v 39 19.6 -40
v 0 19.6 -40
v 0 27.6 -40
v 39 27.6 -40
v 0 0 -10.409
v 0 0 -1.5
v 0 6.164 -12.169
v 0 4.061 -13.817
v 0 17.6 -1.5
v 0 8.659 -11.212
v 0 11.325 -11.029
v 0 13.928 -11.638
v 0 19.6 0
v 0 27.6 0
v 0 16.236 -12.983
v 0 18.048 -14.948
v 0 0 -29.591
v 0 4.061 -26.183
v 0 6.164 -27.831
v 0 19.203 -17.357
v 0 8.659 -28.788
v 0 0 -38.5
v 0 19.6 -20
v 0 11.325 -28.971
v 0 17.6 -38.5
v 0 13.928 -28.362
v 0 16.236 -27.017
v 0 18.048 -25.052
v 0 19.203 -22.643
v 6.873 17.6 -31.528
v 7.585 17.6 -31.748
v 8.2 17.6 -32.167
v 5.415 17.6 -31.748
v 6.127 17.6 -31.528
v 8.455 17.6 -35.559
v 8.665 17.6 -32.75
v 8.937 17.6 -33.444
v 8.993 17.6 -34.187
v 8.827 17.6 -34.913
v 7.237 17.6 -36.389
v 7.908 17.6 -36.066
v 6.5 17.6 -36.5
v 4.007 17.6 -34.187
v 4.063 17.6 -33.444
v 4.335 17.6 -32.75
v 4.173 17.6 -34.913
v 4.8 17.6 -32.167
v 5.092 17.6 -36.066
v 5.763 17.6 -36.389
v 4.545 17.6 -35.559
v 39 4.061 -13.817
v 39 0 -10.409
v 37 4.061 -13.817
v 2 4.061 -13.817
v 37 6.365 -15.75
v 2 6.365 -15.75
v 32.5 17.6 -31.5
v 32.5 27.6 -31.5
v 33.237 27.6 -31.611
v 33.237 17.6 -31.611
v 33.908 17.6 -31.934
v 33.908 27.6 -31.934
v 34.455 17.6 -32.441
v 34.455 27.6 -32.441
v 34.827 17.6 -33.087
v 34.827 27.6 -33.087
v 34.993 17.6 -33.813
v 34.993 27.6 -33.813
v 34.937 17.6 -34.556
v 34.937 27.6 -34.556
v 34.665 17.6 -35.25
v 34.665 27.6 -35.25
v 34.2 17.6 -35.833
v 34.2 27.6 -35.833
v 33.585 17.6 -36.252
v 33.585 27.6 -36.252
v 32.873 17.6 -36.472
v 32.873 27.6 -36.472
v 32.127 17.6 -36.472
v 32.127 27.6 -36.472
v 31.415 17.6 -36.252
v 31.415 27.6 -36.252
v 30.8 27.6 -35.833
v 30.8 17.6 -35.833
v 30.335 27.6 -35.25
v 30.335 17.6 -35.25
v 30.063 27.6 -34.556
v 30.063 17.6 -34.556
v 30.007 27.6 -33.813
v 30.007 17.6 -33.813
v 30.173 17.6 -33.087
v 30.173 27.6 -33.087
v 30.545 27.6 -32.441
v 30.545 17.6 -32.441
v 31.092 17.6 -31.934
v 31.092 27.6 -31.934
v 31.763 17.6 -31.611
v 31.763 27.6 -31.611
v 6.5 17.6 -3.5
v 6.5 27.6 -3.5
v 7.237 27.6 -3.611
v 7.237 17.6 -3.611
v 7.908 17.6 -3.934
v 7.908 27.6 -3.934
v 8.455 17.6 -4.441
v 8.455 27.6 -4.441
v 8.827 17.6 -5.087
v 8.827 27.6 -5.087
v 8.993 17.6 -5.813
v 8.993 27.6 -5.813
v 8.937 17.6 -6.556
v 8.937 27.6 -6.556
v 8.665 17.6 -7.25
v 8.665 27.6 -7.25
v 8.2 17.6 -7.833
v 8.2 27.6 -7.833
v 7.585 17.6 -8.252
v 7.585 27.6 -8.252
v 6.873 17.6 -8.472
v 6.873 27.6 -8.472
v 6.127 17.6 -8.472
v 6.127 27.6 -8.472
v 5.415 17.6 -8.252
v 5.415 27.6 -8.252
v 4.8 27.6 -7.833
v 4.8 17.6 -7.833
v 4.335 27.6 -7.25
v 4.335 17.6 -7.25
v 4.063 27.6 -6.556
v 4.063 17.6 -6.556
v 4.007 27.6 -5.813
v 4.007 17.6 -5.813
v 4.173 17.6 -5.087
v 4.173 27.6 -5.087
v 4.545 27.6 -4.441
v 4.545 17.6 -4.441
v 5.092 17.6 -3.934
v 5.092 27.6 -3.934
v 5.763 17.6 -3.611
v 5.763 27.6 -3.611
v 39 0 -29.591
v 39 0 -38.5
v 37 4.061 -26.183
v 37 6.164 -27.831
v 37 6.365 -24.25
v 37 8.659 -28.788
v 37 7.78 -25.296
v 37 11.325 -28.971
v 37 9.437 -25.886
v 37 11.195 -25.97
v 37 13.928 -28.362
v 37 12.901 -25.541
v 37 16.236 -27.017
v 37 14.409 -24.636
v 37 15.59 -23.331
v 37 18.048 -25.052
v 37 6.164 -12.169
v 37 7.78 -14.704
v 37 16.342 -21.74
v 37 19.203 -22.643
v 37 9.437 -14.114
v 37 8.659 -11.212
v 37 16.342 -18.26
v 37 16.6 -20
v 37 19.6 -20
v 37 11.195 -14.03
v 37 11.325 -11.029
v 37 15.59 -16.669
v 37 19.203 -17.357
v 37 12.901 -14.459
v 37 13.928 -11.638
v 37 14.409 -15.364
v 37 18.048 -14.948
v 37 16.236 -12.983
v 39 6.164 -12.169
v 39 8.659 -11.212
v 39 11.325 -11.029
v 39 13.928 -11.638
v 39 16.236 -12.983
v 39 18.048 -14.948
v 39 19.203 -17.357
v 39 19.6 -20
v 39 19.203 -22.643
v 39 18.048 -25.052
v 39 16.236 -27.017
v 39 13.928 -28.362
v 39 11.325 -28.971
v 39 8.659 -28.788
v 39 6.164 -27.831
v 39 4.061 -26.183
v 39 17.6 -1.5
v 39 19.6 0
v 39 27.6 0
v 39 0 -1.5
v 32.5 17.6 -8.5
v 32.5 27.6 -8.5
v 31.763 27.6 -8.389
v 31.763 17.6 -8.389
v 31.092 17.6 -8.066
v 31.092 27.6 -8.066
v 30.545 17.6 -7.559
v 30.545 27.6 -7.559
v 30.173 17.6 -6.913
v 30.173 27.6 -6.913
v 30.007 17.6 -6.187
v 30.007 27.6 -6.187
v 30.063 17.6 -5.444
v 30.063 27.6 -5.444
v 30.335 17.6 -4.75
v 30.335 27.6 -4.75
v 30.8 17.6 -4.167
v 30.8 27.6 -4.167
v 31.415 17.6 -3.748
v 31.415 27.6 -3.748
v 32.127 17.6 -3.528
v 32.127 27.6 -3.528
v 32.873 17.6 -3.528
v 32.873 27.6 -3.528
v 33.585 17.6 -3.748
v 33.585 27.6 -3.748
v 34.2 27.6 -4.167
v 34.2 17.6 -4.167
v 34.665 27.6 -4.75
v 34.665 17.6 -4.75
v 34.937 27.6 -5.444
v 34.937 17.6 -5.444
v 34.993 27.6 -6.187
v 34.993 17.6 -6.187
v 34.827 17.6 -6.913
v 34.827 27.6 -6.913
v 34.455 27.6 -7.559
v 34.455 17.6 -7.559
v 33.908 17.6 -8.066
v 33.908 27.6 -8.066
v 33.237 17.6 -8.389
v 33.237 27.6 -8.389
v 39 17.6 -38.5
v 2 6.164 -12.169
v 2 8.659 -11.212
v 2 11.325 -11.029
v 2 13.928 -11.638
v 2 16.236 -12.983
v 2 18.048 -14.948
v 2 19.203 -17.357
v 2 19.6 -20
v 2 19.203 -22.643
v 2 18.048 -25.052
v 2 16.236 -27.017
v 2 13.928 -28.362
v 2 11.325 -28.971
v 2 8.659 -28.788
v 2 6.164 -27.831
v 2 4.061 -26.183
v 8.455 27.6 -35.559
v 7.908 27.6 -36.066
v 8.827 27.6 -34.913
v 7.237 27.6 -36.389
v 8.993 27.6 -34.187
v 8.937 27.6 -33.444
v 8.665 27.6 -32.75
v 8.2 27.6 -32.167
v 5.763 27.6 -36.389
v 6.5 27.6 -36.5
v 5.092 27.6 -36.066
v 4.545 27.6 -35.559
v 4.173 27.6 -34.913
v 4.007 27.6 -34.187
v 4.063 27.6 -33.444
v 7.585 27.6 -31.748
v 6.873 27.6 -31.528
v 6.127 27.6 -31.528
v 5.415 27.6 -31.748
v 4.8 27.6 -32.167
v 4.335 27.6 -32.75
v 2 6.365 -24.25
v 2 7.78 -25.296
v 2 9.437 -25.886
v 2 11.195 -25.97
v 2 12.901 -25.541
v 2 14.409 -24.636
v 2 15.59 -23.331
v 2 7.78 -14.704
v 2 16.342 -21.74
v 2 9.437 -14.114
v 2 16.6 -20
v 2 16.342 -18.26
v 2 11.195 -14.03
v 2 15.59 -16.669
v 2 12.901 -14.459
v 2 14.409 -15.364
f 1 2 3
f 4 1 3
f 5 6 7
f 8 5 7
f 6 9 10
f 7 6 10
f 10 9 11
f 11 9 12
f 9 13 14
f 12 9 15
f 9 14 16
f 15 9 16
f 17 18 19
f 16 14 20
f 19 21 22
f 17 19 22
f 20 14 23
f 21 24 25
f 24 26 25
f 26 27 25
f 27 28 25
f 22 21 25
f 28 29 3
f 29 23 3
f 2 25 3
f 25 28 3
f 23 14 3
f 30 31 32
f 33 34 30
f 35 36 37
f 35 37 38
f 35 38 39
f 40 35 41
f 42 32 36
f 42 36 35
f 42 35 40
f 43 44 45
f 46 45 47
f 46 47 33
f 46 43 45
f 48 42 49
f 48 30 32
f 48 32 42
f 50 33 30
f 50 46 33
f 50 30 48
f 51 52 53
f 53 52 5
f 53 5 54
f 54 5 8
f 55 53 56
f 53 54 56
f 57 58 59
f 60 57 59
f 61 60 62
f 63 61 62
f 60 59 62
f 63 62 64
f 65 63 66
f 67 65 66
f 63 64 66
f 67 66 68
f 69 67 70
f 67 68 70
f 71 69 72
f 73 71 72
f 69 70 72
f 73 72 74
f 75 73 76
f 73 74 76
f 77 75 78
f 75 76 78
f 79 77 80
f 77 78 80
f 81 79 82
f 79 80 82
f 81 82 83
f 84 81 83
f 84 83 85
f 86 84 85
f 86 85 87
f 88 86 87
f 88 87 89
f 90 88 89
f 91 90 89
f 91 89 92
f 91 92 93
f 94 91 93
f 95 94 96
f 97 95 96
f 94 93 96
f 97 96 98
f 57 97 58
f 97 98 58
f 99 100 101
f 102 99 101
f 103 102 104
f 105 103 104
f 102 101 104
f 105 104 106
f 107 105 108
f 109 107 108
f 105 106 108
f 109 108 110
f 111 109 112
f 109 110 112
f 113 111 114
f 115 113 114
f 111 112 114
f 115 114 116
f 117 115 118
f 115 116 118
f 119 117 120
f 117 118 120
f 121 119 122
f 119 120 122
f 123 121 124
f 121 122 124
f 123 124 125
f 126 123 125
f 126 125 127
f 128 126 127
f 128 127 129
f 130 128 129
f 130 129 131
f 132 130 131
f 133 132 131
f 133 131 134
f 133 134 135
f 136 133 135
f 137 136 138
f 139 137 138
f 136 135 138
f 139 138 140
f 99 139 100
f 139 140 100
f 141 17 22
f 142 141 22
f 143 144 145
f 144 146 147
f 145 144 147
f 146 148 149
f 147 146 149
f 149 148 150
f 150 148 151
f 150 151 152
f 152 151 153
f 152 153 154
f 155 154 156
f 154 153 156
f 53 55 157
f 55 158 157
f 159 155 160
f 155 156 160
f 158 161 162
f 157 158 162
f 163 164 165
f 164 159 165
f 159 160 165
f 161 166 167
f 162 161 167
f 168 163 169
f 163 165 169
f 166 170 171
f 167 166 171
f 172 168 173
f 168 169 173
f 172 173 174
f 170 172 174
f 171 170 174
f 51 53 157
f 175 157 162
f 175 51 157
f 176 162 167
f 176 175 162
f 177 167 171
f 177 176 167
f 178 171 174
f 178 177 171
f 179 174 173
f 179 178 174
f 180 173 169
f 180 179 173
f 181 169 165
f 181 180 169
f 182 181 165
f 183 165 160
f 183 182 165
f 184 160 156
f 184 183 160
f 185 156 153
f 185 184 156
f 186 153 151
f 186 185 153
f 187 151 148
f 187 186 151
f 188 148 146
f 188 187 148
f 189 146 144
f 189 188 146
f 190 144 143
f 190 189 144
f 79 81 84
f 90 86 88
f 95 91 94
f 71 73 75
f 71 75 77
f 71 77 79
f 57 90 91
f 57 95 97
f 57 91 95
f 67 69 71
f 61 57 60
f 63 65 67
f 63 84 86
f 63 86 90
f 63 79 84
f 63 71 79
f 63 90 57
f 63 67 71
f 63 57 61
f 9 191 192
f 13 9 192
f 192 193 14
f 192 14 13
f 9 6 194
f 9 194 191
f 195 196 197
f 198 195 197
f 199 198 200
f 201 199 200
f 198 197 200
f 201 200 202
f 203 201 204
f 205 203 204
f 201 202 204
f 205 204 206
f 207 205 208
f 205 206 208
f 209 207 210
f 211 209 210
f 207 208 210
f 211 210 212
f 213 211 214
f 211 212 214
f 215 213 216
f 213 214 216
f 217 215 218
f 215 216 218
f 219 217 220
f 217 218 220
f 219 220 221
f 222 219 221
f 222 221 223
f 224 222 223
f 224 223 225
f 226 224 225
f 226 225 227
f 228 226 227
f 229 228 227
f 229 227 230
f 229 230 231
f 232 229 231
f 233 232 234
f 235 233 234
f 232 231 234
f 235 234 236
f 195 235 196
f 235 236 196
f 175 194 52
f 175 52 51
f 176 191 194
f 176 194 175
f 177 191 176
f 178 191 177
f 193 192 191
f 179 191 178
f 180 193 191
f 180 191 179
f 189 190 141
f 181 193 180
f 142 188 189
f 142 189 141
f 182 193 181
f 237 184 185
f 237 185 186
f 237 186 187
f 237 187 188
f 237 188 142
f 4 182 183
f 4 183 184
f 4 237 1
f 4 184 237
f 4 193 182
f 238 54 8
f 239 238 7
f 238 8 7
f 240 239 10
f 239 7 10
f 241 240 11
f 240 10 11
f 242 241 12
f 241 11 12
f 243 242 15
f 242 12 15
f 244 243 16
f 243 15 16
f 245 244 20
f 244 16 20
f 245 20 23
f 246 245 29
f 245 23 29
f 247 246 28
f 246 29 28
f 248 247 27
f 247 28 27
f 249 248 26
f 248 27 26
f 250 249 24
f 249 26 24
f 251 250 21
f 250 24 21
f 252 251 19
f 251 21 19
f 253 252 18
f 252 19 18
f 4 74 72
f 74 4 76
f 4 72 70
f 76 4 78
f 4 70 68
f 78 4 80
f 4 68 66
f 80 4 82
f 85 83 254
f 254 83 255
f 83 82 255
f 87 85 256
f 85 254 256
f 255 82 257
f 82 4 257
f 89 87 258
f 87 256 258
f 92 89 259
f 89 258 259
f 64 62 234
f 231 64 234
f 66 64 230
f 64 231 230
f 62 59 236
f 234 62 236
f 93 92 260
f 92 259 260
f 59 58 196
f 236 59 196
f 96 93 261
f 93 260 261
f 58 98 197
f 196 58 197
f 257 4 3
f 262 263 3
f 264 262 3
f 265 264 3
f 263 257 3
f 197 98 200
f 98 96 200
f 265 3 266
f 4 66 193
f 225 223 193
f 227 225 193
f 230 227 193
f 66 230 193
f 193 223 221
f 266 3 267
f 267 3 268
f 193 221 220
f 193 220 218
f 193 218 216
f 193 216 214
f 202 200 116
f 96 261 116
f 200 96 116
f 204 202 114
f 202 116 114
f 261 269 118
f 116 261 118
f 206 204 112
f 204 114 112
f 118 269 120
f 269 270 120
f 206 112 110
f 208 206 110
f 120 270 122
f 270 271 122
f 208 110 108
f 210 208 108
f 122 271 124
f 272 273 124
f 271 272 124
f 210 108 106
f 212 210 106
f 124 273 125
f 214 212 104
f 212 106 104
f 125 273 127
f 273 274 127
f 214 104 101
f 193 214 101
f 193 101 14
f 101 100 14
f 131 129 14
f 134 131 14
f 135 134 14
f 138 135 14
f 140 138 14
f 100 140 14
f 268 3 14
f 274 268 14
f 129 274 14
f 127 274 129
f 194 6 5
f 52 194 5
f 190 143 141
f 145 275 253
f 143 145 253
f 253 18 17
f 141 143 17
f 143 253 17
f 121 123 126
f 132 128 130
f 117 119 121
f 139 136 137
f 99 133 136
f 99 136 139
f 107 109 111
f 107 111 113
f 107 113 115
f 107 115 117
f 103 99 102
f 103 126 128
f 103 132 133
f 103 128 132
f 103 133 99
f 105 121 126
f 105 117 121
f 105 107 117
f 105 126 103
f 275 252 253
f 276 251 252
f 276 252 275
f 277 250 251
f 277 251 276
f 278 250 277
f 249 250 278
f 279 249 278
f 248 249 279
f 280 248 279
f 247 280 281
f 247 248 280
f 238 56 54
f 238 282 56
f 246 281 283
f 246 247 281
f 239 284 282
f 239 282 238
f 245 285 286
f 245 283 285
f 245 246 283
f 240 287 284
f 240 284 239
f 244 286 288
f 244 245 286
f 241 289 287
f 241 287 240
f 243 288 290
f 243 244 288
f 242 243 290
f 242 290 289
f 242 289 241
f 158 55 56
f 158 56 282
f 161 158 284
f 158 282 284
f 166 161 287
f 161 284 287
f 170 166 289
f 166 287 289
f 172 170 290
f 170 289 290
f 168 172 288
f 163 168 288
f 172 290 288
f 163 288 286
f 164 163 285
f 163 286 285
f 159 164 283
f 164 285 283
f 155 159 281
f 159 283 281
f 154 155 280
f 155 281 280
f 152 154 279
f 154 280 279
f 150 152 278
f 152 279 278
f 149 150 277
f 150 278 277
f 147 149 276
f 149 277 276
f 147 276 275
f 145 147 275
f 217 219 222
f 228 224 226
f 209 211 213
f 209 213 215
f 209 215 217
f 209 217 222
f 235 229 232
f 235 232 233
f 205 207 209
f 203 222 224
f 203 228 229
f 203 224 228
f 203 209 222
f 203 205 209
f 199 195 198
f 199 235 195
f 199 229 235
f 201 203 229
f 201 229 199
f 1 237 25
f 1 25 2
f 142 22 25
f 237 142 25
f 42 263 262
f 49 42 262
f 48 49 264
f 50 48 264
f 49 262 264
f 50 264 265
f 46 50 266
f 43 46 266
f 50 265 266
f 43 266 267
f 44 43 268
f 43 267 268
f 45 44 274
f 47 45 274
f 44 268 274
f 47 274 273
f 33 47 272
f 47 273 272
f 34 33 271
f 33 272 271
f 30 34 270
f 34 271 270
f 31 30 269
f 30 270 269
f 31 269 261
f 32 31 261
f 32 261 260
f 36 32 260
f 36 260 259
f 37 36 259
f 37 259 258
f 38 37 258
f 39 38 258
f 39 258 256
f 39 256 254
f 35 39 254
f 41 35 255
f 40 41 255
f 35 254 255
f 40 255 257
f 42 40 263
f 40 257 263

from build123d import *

# Parameters (mm, degrees)
EXTRUDE_1_DEPTH     = 39
SKETCH_3_R          = 9
CUT_EXTRUDE_1_DEPTH = 2
SKETCH_4_R          = 2.5
CUT_EXTRUDE_2_DEPTH = 10
CUT_EXTRUDE_4_DEPTH = 63.311796636


with BuildPart() as part:
    # 草图1 → 凸台-拉伸1 (new body)
    with BuildSketch(Plane(origin=(0, 0, 0), x_dir=(0, 0, -1), z_dir=(1, 0, 0))):
        with BuildLine():
            Line((0, 0), (10.409356218, 0))
            Line((10.409356218, 0), (15.75, 6.364731413))
            ThreePointArc((15.75, 6.364731413), (20, 16.6), (24.25, 6.364731413))
            Line((24.25, 6.364731413), (29.590643782, 0))
            Line((29.590643782, 0), (40, 0))
            Line((40, 0), (40, 27.6))
            Line((40, 27.6), (0, 27.6))
            Line((0, 27.6), (0, 0))
        make_face()
    extrude(amount=EXTRUDE_1_DEPTH)

    # 草图3 → 切除-拉伸1 (cut)
    with BuildSketch(Plane.ZY):
        with Locations((-20, 10.6)):
            Circle(SKETCH_3_R)
    cut_extrude_1 = extrude(amount=-CUT_EXTRUDE_1_DEPTH, mode=Mode.SUBTRACT)

    # 镜向1: 切除-拉伸1 across plane
    add(cut_extrude_1.mirror(Plane(origin=(19.5, 0, 0), x_dir=(0, 0, 1), z_dir=(1, 0, 0))), mode=Mode.SUBTRACT)

    # 草图4 → 切除-拉伸2 (cut)
    with BuildSketch(Plane(origin=(0, 27.6, 0), x_dir=(1, 0, 0), z_dir=(0, 1, 0))):
        with Locations(Location((6.5, 6, 0), (0, 0, 270))):
            Circle(SKETCH_4_R)
        with Locations(Location((6.5, 34, 0), (0, 0, 90))):
            Circle(SKETCH_4_R)
        with Locations(Location((32.5, 6, 0), (0, 0, 90))):
            Circle(SKETCH_4_R)
        with Locations(Location((32.5, 34, 0), (0, 0, 270))):
            Circle(SKETCH_4_R)
    extrude(amount=-CUT_EXTRUDE_2_DEPTH, mode=Mode.SUBTRACT)

    # 草图5 → 切除-拉伸4 (cut, through all)
    with BuildSketch(Plane.ZY):
        Polygon((0, 0), (-1.5, 0), (-1.5, 17.6), (0, 19.6), align=None)
        Polygon((-40, 19.6), (-40, 0), (-38.5, 0), (-38.5, 17.6), align=None)
    extrude(amount=-CUT_EXTRUDE_4_DEPTH, mode=Mode.SUBTRACT)


solid = part.part
